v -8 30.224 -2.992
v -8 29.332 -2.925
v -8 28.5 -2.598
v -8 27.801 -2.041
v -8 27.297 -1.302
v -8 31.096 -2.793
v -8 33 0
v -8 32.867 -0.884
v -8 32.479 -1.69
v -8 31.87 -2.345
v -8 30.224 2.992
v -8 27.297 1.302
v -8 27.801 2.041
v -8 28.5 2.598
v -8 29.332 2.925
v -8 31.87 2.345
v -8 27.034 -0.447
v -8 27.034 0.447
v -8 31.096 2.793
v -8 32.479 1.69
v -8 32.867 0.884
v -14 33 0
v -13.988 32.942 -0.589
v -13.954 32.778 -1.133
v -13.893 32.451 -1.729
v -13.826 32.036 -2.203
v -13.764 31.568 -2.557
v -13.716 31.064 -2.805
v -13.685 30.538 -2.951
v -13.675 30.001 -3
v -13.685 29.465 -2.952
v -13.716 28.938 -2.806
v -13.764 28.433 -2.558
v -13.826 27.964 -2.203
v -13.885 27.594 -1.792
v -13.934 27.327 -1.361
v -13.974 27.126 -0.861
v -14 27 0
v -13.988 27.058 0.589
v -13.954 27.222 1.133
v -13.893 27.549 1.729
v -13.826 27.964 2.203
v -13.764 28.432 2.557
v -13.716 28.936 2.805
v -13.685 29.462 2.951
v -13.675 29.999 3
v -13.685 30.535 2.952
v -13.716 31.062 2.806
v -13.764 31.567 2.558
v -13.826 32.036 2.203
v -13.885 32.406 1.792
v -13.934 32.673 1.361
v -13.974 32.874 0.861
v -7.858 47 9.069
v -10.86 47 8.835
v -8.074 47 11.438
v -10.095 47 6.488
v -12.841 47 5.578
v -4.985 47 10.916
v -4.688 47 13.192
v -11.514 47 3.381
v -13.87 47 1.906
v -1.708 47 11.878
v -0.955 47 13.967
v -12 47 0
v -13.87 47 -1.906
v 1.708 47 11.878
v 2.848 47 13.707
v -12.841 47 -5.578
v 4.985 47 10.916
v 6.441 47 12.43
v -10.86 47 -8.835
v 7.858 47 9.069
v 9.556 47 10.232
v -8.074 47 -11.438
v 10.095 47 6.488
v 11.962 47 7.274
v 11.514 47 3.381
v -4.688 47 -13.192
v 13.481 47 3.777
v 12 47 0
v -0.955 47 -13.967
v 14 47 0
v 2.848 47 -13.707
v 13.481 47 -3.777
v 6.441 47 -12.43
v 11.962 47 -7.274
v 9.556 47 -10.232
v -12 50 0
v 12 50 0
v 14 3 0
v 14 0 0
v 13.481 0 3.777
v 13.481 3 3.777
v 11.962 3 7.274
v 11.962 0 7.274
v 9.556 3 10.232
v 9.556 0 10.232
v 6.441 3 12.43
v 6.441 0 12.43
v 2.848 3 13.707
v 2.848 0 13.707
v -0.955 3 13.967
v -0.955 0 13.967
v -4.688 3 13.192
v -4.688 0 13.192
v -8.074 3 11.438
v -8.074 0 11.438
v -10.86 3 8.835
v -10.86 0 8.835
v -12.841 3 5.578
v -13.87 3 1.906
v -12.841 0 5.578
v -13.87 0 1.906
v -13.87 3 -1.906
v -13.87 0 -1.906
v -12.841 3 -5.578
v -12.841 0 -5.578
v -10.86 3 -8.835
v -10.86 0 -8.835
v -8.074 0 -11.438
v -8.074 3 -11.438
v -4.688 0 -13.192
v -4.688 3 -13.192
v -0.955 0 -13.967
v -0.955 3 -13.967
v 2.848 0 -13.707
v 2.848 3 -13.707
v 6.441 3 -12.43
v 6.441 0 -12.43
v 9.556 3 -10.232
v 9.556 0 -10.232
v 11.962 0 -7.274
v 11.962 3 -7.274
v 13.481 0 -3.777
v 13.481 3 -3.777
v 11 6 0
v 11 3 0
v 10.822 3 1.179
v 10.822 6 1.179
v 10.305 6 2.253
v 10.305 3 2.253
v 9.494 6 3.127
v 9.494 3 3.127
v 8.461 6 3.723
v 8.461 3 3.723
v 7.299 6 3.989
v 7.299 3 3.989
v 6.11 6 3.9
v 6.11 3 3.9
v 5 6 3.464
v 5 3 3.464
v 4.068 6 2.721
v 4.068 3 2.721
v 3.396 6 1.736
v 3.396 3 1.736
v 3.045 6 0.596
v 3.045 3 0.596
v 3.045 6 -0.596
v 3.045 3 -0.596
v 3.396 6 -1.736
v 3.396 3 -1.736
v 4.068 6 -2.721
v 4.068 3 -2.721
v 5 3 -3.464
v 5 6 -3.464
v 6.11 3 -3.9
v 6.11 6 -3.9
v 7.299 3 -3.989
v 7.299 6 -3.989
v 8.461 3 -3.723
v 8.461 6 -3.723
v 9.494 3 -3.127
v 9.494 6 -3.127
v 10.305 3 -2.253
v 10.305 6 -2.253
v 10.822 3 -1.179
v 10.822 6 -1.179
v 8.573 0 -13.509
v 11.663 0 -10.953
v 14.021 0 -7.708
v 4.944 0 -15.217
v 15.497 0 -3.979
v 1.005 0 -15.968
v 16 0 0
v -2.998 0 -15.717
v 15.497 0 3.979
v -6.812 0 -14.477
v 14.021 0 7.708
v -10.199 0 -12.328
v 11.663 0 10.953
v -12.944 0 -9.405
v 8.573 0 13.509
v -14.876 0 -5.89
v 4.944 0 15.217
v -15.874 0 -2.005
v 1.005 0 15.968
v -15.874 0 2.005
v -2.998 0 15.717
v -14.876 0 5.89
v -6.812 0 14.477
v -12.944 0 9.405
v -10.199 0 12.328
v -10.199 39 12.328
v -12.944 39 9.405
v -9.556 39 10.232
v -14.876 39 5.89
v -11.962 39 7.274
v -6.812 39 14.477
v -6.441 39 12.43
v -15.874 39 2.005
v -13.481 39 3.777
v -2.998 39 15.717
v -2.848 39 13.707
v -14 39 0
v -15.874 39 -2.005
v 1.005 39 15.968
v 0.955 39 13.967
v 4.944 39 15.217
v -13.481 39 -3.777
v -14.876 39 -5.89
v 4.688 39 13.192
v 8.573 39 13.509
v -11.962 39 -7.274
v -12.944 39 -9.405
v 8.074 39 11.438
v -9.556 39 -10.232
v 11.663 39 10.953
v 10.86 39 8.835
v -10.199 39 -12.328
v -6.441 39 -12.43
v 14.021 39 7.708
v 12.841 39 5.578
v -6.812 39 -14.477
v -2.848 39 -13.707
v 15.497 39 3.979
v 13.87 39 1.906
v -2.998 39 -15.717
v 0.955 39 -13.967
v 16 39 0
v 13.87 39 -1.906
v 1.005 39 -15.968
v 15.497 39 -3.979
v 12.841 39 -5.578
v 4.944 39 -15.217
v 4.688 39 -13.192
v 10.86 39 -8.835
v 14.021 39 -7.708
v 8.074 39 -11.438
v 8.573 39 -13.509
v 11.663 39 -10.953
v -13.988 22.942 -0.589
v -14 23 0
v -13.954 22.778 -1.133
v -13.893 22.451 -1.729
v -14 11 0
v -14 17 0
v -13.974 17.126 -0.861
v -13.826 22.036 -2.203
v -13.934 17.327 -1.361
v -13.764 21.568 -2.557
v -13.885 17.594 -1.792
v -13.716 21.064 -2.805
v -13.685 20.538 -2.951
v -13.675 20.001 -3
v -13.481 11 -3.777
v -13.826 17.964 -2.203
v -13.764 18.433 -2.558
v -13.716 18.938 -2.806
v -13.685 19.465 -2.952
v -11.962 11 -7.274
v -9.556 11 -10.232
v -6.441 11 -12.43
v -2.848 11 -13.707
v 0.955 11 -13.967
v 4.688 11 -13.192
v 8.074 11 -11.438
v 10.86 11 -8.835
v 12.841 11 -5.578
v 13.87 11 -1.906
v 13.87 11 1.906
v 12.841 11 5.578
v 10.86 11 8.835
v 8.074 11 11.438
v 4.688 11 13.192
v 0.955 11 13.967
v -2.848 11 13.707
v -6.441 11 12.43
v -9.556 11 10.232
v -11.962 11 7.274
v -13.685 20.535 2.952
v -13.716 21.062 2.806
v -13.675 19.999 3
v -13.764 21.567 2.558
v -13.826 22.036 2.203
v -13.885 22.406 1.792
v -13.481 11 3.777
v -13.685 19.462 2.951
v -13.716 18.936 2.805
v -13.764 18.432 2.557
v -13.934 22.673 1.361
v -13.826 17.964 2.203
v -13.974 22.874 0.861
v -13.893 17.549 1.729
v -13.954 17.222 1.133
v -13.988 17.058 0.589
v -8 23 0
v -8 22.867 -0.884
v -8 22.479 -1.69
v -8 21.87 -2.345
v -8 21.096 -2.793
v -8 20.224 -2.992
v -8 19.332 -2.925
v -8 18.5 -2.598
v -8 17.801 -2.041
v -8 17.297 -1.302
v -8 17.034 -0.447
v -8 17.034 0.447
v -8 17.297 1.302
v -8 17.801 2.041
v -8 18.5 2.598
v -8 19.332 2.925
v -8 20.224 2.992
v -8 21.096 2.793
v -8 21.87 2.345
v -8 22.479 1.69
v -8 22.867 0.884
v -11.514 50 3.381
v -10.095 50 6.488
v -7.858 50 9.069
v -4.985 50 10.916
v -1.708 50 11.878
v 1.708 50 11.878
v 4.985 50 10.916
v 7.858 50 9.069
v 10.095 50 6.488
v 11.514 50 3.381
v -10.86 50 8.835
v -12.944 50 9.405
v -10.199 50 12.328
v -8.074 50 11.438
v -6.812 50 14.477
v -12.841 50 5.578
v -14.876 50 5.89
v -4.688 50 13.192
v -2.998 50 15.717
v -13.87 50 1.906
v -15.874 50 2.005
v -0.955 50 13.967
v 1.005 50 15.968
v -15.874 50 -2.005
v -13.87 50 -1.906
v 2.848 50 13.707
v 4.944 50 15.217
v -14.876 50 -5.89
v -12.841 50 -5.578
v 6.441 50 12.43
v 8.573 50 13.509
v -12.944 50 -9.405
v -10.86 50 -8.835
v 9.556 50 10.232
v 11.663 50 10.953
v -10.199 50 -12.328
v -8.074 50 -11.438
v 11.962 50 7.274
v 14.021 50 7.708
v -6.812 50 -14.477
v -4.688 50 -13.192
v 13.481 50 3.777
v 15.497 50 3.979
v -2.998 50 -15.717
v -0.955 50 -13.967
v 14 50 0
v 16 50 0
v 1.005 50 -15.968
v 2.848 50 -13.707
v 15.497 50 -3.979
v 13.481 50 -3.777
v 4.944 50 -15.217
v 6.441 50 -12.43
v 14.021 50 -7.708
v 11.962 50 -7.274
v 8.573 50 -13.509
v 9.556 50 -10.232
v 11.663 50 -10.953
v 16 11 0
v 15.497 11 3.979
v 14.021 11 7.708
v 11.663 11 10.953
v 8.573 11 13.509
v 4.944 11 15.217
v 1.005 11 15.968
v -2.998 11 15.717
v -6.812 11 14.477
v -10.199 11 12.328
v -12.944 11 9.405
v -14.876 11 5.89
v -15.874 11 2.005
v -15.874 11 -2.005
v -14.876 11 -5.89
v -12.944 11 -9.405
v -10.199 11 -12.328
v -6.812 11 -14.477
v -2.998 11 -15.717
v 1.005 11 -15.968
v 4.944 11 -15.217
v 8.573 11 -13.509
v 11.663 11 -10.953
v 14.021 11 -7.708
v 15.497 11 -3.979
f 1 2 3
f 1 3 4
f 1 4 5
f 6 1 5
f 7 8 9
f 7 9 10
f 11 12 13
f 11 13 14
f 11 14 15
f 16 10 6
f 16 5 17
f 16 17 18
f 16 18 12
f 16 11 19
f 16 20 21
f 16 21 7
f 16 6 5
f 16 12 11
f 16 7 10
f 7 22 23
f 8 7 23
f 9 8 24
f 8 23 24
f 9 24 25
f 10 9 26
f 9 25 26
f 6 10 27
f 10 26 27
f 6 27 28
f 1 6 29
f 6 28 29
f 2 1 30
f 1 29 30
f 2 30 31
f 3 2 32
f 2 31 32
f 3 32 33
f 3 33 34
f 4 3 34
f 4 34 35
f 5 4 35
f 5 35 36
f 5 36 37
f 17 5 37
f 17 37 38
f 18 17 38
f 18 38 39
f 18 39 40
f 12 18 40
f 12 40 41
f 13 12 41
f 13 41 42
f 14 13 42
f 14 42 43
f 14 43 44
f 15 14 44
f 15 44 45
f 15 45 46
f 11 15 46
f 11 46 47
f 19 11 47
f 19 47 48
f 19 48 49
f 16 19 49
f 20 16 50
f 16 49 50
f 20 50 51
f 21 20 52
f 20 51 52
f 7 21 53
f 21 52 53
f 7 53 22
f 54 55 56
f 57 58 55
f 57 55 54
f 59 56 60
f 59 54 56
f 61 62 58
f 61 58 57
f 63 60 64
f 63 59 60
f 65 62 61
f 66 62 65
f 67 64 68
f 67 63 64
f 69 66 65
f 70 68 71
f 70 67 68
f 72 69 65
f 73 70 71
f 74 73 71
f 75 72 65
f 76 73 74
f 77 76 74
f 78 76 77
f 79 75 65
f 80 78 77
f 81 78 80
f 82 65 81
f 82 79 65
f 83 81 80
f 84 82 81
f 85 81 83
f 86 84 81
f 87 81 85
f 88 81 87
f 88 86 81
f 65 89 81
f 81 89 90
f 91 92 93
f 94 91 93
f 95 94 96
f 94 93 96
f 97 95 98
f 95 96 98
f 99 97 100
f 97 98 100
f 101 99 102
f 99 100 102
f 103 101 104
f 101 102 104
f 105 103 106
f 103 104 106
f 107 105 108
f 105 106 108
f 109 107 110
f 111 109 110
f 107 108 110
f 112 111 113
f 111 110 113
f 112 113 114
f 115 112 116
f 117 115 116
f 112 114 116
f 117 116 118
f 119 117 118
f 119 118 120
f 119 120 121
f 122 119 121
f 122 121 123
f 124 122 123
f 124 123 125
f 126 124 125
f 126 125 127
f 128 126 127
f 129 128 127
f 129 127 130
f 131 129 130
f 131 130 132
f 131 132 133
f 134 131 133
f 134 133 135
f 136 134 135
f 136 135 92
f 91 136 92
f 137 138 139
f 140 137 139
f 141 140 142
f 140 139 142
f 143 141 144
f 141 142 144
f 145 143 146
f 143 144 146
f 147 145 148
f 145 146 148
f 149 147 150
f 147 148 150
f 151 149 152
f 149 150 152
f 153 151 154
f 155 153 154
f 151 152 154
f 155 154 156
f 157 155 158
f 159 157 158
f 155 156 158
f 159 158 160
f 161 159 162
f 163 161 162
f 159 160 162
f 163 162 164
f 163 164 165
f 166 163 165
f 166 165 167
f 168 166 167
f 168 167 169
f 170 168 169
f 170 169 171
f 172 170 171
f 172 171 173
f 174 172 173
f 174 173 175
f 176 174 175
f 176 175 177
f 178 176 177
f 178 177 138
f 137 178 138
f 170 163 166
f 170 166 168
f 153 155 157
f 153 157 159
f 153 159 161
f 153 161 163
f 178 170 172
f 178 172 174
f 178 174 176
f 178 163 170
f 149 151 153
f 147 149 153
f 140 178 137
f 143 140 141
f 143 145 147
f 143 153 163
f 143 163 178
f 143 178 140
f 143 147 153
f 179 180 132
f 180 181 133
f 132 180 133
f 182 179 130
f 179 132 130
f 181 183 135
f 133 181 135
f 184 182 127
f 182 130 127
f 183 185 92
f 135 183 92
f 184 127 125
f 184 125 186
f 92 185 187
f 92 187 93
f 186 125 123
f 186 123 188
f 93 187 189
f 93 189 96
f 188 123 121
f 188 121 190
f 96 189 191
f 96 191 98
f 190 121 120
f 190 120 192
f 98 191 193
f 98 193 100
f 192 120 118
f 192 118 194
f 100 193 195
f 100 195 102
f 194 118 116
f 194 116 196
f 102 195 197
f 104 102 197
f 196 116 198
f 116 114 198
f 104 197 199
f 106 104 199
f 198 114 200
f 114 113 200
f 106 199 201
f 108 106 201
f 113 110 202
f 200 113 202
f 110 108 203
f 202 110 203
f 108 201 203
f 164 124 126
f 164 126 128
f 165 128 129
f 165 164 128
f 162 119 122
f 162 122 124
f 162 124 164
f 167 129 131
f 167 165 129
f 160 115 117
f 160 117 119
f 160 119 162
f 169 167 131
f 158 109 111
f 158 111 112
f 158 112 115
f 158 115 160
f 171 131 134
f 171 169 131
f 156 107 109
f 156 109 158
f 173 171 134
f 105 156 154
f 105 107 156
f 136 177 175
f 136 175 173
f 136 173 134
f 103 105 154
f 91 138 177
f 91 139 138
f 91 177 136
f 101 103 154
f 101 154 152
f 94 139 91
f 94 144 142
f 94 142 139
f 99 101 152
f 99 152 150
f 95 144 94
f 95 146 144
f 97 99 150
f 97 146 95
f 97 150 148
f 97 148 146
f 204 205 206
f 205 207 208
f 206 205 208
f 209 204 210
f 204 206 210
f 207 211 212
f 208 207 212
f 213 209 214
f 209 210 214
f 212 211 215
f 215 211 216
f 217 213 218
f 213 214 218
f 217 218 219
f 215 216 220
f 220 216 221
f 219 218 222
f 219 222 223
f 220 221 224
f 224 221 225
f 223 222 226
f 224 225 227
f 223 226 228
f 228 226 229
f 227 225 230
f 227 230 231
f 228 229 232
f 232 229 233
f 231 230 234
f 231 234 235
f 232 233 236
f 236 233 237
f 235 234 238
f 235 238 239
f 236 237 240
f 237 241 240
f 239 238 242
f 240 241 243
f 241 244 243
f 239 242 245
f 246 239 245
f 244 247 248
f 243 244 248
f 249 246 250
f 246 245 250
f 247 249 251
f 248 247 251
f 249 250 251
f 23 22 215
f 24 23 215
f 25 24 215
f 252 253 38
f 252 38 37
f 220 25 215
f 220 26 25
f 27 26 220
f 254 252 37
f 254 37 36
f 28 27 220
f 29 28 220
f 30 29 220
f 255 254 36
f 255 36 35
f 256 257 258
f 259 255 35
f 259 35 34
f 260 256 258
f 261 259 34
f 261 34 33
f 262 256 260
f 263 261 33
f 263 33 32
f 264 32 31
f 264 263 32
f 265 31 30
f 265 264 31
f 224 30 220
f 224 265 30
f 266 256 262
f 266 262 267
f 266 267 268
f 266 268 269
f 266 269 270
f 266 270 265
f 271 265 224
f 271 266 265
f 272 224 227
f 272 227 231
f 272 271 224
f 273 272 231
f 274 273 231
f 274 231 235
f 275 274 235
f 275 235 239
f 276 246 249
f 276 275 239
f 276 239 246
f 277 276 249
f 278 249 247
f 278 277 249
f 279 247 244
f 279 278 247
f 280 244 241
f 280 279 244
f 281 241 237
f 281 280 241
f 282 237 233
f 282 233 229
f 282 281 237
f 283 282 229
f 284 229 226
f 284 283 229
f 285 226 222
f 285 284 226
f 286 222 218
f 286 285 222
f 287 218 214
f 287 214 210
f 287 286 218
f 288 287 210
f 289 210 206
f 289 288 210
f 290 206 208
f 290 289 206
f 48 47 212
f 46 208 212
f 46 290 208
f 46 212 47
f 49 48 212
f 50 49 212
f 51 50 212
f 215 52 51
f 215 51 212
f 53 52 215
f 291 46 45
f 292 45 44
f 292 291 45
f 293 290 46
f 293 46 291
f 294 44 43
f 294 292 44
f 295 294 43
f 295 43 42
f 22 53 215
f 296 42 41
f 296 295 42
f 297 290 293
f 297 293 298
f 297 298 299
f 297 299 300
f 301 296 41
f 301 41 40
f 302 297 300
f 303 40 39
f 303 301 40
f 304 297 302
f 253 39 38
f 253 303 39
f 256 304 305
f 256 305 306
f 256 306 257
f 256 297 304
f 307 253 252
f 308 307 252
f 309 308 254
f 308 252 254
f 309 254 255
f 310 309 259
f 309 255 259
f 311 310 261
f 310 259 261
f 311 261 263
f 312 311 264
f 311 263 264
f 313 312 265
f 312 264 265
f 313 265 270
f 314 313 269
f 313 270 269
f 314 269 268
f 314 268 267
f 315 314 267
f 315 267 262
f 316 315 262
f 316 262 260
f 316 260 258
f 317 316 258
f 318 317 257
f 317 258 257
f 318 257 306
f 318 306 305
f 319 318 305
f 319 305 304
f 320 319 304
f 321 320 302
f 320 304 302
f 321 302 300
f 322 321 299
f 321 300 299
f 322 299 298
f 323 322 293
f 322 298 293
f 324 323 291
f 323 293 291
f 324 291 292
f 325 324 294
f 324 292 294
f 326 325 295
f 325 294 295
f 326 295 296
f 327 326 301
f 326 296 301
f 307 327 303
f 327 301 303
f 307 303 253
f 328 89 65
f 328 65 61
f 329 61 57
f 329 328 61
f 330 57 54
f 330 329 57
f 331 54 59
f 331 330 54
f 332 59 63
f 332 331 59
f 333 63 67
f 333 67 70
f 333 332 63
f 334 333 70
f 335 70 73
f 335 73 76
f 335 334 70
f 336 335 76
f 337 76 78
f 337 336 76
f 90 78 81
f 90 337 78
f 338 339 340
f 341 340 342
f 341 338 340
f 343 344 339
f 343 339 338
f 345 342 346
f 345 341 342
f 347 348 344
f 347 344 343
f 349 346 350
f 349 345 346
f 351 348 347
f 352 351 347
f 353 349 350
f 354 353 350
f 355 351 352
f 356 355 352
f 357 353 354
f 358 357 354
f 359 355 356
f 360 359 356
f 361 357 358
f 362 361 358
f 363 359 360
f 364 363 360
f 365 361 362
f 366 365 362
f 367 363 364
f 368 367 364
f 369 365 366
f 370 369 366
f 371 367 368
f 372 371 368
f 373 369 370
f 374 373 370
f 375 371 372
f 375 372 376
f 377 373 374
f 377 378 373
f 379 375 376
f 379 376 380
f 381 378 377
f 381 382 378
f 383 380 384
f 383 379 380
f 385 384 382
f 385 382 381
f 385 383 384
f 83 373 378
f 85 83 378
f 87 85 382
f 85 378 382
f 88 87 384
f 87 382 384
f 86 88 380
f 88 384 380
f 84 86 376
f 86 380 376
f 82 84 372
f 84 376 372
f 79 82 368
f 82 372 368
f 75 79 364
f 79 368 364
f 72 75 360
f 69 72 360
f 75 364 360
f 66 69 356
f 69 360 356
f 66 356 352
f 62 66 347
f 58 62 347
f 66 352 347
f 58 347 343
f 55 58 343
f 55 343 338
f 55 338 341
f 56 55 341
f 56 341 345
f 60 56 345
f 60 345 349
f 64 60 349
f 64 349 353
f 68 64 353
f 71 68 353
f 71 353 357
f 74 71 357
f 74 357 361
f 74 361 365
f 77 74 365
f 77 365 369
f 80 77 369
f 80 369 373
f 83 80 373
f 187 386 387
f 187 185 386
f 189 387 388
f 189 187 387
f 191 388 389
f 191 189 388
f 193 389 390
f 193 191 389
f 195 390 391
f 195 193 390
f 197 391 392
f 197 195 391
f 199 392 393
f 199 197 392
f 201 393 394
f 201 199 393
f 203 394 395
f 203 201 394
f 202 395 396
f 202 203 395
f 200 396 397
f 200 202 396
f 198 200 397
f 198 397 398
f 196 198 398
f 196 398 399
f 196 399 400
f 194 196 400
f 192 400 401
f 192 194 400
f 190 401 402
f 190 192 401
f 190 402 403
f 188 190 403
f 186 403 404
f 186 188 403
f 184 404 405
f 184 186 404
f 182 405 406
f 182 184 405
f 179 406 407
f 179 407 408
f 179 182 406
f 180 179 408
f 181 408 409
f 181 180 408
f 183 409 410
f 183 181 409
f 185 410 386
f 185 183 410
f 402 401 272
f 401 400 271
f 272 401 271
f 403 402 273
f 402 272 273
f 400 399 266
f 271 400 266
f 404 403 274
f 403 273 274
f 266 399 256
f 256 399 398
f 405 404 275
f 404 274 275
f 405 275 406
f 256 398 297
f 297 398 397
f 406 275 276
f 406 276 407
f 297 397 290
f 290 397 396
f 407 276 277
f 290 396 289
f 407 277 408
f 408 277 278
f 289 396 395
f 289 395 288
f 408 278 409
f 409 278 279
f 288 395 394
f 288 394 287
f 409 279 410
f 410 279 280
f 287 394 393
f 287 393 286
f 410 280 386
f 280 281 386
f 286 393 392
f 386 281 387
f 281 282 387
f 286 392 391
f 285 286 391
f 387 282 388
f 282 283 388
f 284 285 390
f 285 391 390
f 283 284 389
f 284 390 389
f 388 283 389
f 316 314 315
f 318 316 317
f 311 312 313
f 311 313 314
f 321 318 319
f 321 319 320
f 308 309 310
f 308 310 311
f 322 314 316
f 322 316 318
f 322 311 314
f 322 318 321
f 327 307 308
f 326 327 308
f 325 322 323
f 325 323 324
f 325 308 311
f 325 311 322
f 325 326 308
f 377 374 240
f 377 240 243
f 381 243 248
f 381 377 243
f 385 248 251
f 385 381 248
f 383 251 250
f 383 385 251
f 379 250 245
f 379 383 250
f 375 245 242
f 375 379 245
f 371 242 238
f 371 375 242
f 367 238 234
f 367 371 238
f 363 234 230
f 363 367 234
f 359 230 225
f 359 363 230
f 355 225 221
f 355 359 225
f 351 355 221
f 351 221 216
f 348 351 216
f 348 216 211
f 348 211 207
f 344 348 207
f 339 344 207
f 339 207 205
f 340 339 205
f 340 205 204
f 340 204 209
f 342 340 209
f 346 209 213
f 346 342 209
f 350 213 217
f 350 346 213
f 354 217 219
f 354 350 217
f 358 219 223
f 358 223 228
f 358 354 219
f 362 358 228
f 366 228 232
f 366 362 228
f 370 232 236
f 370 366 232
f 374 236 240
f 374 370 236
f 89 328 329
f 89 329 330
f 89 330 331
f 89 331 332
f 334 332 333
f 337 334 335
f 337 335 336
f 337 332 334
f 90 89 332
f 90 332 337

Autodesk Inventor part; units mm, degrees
ref_plane "XZ Plane" through (0, 0, 0) normal (0, 1, 0) x (-1, 0, 0)
ref_plane "XY Plane" through (0, 0, 0) normal (0, 0, 1) x (1, 0, 0)
sketch "Sketch1" plane through (0, 0, 0) normal (0, 1, 0) x (-1, 0, 0)
  circle A0 centre (0, 0) radius 16
  circle A1 centre (0, 0) radius 14
  dimension "d0" = 32
  dimension "d1" = 28
extrude "Extrusion1" add sketch "Sketch1" along normal blind 50 contours A1
sketch "Sketch2" plane through (0, 0, 0) normal (0, -1, 0) x (1, 0, 0)
  circle A0 centre (0, 0) radius 16
  dimension "d4" = 32
extrude "Extrusion2" add sketch "Sketch2" against normal blind 11
sketch "Sketch3" plane through (0, 50, 0) normal (0, 1, 0) x (1, 0, 0)
  circle A0 centre (0, 0) radius 16
extrude "Extrusion3" add sketch "Sketch3" against normal blind 11
ref_plane "Work Plane1" through (-14, 0, 0) normal (1, 0, 0) x (0, 1, 0)
sketch "Sketch5" plane through (-14, 0, 0) normal (1, 0, 0) x (0, 1, 0)
  line L0 (39, 14) -> (39, -14) construction
  line L1 (39, 0) -> (11, 0) construction
  line L2 (11, -14) -> (11, 14) construction
  line L3 (39, 0) -> (30, 0) construction
  line L4 (11, 0) -> (20, 0) construction
  circle A0 centre (30, 0) radius 3
  circle A1 centre (20, 0) radius 3
  point P0 (0, 0)
  dimension "d10" = 9
  dimension "d11" = 9
  dimension "d12" = 6
  dimension "d13" = 6
extrude "Extrusion4" cut sketch "Sketch5" along normal blind 8
sketch "Sketch6" plane through (-6, 30, 0) normal (-1, 0, 0) x (0, 0, 1)
  line L0 (-4.6081, 4.2685) -> (5.6465, 4.2685)
  line L1 (5.6465, 4.2685) -> (5.6465, -14.2936)
  line L2 (5.6465, -14.2936) -> (-4.6081, -14.2936)
  line L3 (-4.6081, -14.2936) -> (-4.6081, 4.2685)
  point P0 (0, -30)
extrude "Extrusion5" add sketch "Sketch6" along normal blind 2
sketch "Sketch7" plane through (0, 50, 0) normal (0, 1, 0) x (1, 0, 0)
  circle A0 centre (0, 0) radius 14
  circle A1 centre (0, 0) radius 12
  dimension "d18" = 28
  dimension "d19" = 24
extrude "Extrusion6" cut sketch "Sketch7" against normal blind 3
sketch "Sketch8" plane through (0, 50, 0) normal (0, 1, 0) x (1, 0, 0)
  circle A0 centre (0, 0) radius 12 projected
  line L0 (-12, 0) -> (12, 0)
  arc A1 (12, 0) -> (-12, 0) centre (0, 0) ccw
extrude "Extrusion7" cut sketch "Sketch8" against normal up to surface (3 mm away) contours L0 A0 picked at (2.994, 4.567)
sketch "Sketch9" plane through (0, 0, 0) normal (0, -1, 0) x (1, 0, 0)
  arc A0 (12, 0) -> (-12, 0) centre (0, 0) ccw projected
  line L0 (12, 0) -> (-12, 0) projected
  circle A1 centre (0, 0) radius 12
  circle A2 centre (0, 0) radius 14
extrude "Extrusion8" cut sketch "Sketch9" against normal blind 3 contours L0 A0 | A1 L0 | A2
sketch "Sketch10" plane through (0, 3, 0) normal (0, -1, 0) x (1, 0, 0)
  line L0 (0, 0) -> (7, 0) construction
  line L1 (12, 0) -> (-12, 0) projected
  circle A0 centre (7, 0) radius 4
extrude "Extrusion9" cut sketch "Sketch10" against normal blind 3
properties part number "Middle handle"
